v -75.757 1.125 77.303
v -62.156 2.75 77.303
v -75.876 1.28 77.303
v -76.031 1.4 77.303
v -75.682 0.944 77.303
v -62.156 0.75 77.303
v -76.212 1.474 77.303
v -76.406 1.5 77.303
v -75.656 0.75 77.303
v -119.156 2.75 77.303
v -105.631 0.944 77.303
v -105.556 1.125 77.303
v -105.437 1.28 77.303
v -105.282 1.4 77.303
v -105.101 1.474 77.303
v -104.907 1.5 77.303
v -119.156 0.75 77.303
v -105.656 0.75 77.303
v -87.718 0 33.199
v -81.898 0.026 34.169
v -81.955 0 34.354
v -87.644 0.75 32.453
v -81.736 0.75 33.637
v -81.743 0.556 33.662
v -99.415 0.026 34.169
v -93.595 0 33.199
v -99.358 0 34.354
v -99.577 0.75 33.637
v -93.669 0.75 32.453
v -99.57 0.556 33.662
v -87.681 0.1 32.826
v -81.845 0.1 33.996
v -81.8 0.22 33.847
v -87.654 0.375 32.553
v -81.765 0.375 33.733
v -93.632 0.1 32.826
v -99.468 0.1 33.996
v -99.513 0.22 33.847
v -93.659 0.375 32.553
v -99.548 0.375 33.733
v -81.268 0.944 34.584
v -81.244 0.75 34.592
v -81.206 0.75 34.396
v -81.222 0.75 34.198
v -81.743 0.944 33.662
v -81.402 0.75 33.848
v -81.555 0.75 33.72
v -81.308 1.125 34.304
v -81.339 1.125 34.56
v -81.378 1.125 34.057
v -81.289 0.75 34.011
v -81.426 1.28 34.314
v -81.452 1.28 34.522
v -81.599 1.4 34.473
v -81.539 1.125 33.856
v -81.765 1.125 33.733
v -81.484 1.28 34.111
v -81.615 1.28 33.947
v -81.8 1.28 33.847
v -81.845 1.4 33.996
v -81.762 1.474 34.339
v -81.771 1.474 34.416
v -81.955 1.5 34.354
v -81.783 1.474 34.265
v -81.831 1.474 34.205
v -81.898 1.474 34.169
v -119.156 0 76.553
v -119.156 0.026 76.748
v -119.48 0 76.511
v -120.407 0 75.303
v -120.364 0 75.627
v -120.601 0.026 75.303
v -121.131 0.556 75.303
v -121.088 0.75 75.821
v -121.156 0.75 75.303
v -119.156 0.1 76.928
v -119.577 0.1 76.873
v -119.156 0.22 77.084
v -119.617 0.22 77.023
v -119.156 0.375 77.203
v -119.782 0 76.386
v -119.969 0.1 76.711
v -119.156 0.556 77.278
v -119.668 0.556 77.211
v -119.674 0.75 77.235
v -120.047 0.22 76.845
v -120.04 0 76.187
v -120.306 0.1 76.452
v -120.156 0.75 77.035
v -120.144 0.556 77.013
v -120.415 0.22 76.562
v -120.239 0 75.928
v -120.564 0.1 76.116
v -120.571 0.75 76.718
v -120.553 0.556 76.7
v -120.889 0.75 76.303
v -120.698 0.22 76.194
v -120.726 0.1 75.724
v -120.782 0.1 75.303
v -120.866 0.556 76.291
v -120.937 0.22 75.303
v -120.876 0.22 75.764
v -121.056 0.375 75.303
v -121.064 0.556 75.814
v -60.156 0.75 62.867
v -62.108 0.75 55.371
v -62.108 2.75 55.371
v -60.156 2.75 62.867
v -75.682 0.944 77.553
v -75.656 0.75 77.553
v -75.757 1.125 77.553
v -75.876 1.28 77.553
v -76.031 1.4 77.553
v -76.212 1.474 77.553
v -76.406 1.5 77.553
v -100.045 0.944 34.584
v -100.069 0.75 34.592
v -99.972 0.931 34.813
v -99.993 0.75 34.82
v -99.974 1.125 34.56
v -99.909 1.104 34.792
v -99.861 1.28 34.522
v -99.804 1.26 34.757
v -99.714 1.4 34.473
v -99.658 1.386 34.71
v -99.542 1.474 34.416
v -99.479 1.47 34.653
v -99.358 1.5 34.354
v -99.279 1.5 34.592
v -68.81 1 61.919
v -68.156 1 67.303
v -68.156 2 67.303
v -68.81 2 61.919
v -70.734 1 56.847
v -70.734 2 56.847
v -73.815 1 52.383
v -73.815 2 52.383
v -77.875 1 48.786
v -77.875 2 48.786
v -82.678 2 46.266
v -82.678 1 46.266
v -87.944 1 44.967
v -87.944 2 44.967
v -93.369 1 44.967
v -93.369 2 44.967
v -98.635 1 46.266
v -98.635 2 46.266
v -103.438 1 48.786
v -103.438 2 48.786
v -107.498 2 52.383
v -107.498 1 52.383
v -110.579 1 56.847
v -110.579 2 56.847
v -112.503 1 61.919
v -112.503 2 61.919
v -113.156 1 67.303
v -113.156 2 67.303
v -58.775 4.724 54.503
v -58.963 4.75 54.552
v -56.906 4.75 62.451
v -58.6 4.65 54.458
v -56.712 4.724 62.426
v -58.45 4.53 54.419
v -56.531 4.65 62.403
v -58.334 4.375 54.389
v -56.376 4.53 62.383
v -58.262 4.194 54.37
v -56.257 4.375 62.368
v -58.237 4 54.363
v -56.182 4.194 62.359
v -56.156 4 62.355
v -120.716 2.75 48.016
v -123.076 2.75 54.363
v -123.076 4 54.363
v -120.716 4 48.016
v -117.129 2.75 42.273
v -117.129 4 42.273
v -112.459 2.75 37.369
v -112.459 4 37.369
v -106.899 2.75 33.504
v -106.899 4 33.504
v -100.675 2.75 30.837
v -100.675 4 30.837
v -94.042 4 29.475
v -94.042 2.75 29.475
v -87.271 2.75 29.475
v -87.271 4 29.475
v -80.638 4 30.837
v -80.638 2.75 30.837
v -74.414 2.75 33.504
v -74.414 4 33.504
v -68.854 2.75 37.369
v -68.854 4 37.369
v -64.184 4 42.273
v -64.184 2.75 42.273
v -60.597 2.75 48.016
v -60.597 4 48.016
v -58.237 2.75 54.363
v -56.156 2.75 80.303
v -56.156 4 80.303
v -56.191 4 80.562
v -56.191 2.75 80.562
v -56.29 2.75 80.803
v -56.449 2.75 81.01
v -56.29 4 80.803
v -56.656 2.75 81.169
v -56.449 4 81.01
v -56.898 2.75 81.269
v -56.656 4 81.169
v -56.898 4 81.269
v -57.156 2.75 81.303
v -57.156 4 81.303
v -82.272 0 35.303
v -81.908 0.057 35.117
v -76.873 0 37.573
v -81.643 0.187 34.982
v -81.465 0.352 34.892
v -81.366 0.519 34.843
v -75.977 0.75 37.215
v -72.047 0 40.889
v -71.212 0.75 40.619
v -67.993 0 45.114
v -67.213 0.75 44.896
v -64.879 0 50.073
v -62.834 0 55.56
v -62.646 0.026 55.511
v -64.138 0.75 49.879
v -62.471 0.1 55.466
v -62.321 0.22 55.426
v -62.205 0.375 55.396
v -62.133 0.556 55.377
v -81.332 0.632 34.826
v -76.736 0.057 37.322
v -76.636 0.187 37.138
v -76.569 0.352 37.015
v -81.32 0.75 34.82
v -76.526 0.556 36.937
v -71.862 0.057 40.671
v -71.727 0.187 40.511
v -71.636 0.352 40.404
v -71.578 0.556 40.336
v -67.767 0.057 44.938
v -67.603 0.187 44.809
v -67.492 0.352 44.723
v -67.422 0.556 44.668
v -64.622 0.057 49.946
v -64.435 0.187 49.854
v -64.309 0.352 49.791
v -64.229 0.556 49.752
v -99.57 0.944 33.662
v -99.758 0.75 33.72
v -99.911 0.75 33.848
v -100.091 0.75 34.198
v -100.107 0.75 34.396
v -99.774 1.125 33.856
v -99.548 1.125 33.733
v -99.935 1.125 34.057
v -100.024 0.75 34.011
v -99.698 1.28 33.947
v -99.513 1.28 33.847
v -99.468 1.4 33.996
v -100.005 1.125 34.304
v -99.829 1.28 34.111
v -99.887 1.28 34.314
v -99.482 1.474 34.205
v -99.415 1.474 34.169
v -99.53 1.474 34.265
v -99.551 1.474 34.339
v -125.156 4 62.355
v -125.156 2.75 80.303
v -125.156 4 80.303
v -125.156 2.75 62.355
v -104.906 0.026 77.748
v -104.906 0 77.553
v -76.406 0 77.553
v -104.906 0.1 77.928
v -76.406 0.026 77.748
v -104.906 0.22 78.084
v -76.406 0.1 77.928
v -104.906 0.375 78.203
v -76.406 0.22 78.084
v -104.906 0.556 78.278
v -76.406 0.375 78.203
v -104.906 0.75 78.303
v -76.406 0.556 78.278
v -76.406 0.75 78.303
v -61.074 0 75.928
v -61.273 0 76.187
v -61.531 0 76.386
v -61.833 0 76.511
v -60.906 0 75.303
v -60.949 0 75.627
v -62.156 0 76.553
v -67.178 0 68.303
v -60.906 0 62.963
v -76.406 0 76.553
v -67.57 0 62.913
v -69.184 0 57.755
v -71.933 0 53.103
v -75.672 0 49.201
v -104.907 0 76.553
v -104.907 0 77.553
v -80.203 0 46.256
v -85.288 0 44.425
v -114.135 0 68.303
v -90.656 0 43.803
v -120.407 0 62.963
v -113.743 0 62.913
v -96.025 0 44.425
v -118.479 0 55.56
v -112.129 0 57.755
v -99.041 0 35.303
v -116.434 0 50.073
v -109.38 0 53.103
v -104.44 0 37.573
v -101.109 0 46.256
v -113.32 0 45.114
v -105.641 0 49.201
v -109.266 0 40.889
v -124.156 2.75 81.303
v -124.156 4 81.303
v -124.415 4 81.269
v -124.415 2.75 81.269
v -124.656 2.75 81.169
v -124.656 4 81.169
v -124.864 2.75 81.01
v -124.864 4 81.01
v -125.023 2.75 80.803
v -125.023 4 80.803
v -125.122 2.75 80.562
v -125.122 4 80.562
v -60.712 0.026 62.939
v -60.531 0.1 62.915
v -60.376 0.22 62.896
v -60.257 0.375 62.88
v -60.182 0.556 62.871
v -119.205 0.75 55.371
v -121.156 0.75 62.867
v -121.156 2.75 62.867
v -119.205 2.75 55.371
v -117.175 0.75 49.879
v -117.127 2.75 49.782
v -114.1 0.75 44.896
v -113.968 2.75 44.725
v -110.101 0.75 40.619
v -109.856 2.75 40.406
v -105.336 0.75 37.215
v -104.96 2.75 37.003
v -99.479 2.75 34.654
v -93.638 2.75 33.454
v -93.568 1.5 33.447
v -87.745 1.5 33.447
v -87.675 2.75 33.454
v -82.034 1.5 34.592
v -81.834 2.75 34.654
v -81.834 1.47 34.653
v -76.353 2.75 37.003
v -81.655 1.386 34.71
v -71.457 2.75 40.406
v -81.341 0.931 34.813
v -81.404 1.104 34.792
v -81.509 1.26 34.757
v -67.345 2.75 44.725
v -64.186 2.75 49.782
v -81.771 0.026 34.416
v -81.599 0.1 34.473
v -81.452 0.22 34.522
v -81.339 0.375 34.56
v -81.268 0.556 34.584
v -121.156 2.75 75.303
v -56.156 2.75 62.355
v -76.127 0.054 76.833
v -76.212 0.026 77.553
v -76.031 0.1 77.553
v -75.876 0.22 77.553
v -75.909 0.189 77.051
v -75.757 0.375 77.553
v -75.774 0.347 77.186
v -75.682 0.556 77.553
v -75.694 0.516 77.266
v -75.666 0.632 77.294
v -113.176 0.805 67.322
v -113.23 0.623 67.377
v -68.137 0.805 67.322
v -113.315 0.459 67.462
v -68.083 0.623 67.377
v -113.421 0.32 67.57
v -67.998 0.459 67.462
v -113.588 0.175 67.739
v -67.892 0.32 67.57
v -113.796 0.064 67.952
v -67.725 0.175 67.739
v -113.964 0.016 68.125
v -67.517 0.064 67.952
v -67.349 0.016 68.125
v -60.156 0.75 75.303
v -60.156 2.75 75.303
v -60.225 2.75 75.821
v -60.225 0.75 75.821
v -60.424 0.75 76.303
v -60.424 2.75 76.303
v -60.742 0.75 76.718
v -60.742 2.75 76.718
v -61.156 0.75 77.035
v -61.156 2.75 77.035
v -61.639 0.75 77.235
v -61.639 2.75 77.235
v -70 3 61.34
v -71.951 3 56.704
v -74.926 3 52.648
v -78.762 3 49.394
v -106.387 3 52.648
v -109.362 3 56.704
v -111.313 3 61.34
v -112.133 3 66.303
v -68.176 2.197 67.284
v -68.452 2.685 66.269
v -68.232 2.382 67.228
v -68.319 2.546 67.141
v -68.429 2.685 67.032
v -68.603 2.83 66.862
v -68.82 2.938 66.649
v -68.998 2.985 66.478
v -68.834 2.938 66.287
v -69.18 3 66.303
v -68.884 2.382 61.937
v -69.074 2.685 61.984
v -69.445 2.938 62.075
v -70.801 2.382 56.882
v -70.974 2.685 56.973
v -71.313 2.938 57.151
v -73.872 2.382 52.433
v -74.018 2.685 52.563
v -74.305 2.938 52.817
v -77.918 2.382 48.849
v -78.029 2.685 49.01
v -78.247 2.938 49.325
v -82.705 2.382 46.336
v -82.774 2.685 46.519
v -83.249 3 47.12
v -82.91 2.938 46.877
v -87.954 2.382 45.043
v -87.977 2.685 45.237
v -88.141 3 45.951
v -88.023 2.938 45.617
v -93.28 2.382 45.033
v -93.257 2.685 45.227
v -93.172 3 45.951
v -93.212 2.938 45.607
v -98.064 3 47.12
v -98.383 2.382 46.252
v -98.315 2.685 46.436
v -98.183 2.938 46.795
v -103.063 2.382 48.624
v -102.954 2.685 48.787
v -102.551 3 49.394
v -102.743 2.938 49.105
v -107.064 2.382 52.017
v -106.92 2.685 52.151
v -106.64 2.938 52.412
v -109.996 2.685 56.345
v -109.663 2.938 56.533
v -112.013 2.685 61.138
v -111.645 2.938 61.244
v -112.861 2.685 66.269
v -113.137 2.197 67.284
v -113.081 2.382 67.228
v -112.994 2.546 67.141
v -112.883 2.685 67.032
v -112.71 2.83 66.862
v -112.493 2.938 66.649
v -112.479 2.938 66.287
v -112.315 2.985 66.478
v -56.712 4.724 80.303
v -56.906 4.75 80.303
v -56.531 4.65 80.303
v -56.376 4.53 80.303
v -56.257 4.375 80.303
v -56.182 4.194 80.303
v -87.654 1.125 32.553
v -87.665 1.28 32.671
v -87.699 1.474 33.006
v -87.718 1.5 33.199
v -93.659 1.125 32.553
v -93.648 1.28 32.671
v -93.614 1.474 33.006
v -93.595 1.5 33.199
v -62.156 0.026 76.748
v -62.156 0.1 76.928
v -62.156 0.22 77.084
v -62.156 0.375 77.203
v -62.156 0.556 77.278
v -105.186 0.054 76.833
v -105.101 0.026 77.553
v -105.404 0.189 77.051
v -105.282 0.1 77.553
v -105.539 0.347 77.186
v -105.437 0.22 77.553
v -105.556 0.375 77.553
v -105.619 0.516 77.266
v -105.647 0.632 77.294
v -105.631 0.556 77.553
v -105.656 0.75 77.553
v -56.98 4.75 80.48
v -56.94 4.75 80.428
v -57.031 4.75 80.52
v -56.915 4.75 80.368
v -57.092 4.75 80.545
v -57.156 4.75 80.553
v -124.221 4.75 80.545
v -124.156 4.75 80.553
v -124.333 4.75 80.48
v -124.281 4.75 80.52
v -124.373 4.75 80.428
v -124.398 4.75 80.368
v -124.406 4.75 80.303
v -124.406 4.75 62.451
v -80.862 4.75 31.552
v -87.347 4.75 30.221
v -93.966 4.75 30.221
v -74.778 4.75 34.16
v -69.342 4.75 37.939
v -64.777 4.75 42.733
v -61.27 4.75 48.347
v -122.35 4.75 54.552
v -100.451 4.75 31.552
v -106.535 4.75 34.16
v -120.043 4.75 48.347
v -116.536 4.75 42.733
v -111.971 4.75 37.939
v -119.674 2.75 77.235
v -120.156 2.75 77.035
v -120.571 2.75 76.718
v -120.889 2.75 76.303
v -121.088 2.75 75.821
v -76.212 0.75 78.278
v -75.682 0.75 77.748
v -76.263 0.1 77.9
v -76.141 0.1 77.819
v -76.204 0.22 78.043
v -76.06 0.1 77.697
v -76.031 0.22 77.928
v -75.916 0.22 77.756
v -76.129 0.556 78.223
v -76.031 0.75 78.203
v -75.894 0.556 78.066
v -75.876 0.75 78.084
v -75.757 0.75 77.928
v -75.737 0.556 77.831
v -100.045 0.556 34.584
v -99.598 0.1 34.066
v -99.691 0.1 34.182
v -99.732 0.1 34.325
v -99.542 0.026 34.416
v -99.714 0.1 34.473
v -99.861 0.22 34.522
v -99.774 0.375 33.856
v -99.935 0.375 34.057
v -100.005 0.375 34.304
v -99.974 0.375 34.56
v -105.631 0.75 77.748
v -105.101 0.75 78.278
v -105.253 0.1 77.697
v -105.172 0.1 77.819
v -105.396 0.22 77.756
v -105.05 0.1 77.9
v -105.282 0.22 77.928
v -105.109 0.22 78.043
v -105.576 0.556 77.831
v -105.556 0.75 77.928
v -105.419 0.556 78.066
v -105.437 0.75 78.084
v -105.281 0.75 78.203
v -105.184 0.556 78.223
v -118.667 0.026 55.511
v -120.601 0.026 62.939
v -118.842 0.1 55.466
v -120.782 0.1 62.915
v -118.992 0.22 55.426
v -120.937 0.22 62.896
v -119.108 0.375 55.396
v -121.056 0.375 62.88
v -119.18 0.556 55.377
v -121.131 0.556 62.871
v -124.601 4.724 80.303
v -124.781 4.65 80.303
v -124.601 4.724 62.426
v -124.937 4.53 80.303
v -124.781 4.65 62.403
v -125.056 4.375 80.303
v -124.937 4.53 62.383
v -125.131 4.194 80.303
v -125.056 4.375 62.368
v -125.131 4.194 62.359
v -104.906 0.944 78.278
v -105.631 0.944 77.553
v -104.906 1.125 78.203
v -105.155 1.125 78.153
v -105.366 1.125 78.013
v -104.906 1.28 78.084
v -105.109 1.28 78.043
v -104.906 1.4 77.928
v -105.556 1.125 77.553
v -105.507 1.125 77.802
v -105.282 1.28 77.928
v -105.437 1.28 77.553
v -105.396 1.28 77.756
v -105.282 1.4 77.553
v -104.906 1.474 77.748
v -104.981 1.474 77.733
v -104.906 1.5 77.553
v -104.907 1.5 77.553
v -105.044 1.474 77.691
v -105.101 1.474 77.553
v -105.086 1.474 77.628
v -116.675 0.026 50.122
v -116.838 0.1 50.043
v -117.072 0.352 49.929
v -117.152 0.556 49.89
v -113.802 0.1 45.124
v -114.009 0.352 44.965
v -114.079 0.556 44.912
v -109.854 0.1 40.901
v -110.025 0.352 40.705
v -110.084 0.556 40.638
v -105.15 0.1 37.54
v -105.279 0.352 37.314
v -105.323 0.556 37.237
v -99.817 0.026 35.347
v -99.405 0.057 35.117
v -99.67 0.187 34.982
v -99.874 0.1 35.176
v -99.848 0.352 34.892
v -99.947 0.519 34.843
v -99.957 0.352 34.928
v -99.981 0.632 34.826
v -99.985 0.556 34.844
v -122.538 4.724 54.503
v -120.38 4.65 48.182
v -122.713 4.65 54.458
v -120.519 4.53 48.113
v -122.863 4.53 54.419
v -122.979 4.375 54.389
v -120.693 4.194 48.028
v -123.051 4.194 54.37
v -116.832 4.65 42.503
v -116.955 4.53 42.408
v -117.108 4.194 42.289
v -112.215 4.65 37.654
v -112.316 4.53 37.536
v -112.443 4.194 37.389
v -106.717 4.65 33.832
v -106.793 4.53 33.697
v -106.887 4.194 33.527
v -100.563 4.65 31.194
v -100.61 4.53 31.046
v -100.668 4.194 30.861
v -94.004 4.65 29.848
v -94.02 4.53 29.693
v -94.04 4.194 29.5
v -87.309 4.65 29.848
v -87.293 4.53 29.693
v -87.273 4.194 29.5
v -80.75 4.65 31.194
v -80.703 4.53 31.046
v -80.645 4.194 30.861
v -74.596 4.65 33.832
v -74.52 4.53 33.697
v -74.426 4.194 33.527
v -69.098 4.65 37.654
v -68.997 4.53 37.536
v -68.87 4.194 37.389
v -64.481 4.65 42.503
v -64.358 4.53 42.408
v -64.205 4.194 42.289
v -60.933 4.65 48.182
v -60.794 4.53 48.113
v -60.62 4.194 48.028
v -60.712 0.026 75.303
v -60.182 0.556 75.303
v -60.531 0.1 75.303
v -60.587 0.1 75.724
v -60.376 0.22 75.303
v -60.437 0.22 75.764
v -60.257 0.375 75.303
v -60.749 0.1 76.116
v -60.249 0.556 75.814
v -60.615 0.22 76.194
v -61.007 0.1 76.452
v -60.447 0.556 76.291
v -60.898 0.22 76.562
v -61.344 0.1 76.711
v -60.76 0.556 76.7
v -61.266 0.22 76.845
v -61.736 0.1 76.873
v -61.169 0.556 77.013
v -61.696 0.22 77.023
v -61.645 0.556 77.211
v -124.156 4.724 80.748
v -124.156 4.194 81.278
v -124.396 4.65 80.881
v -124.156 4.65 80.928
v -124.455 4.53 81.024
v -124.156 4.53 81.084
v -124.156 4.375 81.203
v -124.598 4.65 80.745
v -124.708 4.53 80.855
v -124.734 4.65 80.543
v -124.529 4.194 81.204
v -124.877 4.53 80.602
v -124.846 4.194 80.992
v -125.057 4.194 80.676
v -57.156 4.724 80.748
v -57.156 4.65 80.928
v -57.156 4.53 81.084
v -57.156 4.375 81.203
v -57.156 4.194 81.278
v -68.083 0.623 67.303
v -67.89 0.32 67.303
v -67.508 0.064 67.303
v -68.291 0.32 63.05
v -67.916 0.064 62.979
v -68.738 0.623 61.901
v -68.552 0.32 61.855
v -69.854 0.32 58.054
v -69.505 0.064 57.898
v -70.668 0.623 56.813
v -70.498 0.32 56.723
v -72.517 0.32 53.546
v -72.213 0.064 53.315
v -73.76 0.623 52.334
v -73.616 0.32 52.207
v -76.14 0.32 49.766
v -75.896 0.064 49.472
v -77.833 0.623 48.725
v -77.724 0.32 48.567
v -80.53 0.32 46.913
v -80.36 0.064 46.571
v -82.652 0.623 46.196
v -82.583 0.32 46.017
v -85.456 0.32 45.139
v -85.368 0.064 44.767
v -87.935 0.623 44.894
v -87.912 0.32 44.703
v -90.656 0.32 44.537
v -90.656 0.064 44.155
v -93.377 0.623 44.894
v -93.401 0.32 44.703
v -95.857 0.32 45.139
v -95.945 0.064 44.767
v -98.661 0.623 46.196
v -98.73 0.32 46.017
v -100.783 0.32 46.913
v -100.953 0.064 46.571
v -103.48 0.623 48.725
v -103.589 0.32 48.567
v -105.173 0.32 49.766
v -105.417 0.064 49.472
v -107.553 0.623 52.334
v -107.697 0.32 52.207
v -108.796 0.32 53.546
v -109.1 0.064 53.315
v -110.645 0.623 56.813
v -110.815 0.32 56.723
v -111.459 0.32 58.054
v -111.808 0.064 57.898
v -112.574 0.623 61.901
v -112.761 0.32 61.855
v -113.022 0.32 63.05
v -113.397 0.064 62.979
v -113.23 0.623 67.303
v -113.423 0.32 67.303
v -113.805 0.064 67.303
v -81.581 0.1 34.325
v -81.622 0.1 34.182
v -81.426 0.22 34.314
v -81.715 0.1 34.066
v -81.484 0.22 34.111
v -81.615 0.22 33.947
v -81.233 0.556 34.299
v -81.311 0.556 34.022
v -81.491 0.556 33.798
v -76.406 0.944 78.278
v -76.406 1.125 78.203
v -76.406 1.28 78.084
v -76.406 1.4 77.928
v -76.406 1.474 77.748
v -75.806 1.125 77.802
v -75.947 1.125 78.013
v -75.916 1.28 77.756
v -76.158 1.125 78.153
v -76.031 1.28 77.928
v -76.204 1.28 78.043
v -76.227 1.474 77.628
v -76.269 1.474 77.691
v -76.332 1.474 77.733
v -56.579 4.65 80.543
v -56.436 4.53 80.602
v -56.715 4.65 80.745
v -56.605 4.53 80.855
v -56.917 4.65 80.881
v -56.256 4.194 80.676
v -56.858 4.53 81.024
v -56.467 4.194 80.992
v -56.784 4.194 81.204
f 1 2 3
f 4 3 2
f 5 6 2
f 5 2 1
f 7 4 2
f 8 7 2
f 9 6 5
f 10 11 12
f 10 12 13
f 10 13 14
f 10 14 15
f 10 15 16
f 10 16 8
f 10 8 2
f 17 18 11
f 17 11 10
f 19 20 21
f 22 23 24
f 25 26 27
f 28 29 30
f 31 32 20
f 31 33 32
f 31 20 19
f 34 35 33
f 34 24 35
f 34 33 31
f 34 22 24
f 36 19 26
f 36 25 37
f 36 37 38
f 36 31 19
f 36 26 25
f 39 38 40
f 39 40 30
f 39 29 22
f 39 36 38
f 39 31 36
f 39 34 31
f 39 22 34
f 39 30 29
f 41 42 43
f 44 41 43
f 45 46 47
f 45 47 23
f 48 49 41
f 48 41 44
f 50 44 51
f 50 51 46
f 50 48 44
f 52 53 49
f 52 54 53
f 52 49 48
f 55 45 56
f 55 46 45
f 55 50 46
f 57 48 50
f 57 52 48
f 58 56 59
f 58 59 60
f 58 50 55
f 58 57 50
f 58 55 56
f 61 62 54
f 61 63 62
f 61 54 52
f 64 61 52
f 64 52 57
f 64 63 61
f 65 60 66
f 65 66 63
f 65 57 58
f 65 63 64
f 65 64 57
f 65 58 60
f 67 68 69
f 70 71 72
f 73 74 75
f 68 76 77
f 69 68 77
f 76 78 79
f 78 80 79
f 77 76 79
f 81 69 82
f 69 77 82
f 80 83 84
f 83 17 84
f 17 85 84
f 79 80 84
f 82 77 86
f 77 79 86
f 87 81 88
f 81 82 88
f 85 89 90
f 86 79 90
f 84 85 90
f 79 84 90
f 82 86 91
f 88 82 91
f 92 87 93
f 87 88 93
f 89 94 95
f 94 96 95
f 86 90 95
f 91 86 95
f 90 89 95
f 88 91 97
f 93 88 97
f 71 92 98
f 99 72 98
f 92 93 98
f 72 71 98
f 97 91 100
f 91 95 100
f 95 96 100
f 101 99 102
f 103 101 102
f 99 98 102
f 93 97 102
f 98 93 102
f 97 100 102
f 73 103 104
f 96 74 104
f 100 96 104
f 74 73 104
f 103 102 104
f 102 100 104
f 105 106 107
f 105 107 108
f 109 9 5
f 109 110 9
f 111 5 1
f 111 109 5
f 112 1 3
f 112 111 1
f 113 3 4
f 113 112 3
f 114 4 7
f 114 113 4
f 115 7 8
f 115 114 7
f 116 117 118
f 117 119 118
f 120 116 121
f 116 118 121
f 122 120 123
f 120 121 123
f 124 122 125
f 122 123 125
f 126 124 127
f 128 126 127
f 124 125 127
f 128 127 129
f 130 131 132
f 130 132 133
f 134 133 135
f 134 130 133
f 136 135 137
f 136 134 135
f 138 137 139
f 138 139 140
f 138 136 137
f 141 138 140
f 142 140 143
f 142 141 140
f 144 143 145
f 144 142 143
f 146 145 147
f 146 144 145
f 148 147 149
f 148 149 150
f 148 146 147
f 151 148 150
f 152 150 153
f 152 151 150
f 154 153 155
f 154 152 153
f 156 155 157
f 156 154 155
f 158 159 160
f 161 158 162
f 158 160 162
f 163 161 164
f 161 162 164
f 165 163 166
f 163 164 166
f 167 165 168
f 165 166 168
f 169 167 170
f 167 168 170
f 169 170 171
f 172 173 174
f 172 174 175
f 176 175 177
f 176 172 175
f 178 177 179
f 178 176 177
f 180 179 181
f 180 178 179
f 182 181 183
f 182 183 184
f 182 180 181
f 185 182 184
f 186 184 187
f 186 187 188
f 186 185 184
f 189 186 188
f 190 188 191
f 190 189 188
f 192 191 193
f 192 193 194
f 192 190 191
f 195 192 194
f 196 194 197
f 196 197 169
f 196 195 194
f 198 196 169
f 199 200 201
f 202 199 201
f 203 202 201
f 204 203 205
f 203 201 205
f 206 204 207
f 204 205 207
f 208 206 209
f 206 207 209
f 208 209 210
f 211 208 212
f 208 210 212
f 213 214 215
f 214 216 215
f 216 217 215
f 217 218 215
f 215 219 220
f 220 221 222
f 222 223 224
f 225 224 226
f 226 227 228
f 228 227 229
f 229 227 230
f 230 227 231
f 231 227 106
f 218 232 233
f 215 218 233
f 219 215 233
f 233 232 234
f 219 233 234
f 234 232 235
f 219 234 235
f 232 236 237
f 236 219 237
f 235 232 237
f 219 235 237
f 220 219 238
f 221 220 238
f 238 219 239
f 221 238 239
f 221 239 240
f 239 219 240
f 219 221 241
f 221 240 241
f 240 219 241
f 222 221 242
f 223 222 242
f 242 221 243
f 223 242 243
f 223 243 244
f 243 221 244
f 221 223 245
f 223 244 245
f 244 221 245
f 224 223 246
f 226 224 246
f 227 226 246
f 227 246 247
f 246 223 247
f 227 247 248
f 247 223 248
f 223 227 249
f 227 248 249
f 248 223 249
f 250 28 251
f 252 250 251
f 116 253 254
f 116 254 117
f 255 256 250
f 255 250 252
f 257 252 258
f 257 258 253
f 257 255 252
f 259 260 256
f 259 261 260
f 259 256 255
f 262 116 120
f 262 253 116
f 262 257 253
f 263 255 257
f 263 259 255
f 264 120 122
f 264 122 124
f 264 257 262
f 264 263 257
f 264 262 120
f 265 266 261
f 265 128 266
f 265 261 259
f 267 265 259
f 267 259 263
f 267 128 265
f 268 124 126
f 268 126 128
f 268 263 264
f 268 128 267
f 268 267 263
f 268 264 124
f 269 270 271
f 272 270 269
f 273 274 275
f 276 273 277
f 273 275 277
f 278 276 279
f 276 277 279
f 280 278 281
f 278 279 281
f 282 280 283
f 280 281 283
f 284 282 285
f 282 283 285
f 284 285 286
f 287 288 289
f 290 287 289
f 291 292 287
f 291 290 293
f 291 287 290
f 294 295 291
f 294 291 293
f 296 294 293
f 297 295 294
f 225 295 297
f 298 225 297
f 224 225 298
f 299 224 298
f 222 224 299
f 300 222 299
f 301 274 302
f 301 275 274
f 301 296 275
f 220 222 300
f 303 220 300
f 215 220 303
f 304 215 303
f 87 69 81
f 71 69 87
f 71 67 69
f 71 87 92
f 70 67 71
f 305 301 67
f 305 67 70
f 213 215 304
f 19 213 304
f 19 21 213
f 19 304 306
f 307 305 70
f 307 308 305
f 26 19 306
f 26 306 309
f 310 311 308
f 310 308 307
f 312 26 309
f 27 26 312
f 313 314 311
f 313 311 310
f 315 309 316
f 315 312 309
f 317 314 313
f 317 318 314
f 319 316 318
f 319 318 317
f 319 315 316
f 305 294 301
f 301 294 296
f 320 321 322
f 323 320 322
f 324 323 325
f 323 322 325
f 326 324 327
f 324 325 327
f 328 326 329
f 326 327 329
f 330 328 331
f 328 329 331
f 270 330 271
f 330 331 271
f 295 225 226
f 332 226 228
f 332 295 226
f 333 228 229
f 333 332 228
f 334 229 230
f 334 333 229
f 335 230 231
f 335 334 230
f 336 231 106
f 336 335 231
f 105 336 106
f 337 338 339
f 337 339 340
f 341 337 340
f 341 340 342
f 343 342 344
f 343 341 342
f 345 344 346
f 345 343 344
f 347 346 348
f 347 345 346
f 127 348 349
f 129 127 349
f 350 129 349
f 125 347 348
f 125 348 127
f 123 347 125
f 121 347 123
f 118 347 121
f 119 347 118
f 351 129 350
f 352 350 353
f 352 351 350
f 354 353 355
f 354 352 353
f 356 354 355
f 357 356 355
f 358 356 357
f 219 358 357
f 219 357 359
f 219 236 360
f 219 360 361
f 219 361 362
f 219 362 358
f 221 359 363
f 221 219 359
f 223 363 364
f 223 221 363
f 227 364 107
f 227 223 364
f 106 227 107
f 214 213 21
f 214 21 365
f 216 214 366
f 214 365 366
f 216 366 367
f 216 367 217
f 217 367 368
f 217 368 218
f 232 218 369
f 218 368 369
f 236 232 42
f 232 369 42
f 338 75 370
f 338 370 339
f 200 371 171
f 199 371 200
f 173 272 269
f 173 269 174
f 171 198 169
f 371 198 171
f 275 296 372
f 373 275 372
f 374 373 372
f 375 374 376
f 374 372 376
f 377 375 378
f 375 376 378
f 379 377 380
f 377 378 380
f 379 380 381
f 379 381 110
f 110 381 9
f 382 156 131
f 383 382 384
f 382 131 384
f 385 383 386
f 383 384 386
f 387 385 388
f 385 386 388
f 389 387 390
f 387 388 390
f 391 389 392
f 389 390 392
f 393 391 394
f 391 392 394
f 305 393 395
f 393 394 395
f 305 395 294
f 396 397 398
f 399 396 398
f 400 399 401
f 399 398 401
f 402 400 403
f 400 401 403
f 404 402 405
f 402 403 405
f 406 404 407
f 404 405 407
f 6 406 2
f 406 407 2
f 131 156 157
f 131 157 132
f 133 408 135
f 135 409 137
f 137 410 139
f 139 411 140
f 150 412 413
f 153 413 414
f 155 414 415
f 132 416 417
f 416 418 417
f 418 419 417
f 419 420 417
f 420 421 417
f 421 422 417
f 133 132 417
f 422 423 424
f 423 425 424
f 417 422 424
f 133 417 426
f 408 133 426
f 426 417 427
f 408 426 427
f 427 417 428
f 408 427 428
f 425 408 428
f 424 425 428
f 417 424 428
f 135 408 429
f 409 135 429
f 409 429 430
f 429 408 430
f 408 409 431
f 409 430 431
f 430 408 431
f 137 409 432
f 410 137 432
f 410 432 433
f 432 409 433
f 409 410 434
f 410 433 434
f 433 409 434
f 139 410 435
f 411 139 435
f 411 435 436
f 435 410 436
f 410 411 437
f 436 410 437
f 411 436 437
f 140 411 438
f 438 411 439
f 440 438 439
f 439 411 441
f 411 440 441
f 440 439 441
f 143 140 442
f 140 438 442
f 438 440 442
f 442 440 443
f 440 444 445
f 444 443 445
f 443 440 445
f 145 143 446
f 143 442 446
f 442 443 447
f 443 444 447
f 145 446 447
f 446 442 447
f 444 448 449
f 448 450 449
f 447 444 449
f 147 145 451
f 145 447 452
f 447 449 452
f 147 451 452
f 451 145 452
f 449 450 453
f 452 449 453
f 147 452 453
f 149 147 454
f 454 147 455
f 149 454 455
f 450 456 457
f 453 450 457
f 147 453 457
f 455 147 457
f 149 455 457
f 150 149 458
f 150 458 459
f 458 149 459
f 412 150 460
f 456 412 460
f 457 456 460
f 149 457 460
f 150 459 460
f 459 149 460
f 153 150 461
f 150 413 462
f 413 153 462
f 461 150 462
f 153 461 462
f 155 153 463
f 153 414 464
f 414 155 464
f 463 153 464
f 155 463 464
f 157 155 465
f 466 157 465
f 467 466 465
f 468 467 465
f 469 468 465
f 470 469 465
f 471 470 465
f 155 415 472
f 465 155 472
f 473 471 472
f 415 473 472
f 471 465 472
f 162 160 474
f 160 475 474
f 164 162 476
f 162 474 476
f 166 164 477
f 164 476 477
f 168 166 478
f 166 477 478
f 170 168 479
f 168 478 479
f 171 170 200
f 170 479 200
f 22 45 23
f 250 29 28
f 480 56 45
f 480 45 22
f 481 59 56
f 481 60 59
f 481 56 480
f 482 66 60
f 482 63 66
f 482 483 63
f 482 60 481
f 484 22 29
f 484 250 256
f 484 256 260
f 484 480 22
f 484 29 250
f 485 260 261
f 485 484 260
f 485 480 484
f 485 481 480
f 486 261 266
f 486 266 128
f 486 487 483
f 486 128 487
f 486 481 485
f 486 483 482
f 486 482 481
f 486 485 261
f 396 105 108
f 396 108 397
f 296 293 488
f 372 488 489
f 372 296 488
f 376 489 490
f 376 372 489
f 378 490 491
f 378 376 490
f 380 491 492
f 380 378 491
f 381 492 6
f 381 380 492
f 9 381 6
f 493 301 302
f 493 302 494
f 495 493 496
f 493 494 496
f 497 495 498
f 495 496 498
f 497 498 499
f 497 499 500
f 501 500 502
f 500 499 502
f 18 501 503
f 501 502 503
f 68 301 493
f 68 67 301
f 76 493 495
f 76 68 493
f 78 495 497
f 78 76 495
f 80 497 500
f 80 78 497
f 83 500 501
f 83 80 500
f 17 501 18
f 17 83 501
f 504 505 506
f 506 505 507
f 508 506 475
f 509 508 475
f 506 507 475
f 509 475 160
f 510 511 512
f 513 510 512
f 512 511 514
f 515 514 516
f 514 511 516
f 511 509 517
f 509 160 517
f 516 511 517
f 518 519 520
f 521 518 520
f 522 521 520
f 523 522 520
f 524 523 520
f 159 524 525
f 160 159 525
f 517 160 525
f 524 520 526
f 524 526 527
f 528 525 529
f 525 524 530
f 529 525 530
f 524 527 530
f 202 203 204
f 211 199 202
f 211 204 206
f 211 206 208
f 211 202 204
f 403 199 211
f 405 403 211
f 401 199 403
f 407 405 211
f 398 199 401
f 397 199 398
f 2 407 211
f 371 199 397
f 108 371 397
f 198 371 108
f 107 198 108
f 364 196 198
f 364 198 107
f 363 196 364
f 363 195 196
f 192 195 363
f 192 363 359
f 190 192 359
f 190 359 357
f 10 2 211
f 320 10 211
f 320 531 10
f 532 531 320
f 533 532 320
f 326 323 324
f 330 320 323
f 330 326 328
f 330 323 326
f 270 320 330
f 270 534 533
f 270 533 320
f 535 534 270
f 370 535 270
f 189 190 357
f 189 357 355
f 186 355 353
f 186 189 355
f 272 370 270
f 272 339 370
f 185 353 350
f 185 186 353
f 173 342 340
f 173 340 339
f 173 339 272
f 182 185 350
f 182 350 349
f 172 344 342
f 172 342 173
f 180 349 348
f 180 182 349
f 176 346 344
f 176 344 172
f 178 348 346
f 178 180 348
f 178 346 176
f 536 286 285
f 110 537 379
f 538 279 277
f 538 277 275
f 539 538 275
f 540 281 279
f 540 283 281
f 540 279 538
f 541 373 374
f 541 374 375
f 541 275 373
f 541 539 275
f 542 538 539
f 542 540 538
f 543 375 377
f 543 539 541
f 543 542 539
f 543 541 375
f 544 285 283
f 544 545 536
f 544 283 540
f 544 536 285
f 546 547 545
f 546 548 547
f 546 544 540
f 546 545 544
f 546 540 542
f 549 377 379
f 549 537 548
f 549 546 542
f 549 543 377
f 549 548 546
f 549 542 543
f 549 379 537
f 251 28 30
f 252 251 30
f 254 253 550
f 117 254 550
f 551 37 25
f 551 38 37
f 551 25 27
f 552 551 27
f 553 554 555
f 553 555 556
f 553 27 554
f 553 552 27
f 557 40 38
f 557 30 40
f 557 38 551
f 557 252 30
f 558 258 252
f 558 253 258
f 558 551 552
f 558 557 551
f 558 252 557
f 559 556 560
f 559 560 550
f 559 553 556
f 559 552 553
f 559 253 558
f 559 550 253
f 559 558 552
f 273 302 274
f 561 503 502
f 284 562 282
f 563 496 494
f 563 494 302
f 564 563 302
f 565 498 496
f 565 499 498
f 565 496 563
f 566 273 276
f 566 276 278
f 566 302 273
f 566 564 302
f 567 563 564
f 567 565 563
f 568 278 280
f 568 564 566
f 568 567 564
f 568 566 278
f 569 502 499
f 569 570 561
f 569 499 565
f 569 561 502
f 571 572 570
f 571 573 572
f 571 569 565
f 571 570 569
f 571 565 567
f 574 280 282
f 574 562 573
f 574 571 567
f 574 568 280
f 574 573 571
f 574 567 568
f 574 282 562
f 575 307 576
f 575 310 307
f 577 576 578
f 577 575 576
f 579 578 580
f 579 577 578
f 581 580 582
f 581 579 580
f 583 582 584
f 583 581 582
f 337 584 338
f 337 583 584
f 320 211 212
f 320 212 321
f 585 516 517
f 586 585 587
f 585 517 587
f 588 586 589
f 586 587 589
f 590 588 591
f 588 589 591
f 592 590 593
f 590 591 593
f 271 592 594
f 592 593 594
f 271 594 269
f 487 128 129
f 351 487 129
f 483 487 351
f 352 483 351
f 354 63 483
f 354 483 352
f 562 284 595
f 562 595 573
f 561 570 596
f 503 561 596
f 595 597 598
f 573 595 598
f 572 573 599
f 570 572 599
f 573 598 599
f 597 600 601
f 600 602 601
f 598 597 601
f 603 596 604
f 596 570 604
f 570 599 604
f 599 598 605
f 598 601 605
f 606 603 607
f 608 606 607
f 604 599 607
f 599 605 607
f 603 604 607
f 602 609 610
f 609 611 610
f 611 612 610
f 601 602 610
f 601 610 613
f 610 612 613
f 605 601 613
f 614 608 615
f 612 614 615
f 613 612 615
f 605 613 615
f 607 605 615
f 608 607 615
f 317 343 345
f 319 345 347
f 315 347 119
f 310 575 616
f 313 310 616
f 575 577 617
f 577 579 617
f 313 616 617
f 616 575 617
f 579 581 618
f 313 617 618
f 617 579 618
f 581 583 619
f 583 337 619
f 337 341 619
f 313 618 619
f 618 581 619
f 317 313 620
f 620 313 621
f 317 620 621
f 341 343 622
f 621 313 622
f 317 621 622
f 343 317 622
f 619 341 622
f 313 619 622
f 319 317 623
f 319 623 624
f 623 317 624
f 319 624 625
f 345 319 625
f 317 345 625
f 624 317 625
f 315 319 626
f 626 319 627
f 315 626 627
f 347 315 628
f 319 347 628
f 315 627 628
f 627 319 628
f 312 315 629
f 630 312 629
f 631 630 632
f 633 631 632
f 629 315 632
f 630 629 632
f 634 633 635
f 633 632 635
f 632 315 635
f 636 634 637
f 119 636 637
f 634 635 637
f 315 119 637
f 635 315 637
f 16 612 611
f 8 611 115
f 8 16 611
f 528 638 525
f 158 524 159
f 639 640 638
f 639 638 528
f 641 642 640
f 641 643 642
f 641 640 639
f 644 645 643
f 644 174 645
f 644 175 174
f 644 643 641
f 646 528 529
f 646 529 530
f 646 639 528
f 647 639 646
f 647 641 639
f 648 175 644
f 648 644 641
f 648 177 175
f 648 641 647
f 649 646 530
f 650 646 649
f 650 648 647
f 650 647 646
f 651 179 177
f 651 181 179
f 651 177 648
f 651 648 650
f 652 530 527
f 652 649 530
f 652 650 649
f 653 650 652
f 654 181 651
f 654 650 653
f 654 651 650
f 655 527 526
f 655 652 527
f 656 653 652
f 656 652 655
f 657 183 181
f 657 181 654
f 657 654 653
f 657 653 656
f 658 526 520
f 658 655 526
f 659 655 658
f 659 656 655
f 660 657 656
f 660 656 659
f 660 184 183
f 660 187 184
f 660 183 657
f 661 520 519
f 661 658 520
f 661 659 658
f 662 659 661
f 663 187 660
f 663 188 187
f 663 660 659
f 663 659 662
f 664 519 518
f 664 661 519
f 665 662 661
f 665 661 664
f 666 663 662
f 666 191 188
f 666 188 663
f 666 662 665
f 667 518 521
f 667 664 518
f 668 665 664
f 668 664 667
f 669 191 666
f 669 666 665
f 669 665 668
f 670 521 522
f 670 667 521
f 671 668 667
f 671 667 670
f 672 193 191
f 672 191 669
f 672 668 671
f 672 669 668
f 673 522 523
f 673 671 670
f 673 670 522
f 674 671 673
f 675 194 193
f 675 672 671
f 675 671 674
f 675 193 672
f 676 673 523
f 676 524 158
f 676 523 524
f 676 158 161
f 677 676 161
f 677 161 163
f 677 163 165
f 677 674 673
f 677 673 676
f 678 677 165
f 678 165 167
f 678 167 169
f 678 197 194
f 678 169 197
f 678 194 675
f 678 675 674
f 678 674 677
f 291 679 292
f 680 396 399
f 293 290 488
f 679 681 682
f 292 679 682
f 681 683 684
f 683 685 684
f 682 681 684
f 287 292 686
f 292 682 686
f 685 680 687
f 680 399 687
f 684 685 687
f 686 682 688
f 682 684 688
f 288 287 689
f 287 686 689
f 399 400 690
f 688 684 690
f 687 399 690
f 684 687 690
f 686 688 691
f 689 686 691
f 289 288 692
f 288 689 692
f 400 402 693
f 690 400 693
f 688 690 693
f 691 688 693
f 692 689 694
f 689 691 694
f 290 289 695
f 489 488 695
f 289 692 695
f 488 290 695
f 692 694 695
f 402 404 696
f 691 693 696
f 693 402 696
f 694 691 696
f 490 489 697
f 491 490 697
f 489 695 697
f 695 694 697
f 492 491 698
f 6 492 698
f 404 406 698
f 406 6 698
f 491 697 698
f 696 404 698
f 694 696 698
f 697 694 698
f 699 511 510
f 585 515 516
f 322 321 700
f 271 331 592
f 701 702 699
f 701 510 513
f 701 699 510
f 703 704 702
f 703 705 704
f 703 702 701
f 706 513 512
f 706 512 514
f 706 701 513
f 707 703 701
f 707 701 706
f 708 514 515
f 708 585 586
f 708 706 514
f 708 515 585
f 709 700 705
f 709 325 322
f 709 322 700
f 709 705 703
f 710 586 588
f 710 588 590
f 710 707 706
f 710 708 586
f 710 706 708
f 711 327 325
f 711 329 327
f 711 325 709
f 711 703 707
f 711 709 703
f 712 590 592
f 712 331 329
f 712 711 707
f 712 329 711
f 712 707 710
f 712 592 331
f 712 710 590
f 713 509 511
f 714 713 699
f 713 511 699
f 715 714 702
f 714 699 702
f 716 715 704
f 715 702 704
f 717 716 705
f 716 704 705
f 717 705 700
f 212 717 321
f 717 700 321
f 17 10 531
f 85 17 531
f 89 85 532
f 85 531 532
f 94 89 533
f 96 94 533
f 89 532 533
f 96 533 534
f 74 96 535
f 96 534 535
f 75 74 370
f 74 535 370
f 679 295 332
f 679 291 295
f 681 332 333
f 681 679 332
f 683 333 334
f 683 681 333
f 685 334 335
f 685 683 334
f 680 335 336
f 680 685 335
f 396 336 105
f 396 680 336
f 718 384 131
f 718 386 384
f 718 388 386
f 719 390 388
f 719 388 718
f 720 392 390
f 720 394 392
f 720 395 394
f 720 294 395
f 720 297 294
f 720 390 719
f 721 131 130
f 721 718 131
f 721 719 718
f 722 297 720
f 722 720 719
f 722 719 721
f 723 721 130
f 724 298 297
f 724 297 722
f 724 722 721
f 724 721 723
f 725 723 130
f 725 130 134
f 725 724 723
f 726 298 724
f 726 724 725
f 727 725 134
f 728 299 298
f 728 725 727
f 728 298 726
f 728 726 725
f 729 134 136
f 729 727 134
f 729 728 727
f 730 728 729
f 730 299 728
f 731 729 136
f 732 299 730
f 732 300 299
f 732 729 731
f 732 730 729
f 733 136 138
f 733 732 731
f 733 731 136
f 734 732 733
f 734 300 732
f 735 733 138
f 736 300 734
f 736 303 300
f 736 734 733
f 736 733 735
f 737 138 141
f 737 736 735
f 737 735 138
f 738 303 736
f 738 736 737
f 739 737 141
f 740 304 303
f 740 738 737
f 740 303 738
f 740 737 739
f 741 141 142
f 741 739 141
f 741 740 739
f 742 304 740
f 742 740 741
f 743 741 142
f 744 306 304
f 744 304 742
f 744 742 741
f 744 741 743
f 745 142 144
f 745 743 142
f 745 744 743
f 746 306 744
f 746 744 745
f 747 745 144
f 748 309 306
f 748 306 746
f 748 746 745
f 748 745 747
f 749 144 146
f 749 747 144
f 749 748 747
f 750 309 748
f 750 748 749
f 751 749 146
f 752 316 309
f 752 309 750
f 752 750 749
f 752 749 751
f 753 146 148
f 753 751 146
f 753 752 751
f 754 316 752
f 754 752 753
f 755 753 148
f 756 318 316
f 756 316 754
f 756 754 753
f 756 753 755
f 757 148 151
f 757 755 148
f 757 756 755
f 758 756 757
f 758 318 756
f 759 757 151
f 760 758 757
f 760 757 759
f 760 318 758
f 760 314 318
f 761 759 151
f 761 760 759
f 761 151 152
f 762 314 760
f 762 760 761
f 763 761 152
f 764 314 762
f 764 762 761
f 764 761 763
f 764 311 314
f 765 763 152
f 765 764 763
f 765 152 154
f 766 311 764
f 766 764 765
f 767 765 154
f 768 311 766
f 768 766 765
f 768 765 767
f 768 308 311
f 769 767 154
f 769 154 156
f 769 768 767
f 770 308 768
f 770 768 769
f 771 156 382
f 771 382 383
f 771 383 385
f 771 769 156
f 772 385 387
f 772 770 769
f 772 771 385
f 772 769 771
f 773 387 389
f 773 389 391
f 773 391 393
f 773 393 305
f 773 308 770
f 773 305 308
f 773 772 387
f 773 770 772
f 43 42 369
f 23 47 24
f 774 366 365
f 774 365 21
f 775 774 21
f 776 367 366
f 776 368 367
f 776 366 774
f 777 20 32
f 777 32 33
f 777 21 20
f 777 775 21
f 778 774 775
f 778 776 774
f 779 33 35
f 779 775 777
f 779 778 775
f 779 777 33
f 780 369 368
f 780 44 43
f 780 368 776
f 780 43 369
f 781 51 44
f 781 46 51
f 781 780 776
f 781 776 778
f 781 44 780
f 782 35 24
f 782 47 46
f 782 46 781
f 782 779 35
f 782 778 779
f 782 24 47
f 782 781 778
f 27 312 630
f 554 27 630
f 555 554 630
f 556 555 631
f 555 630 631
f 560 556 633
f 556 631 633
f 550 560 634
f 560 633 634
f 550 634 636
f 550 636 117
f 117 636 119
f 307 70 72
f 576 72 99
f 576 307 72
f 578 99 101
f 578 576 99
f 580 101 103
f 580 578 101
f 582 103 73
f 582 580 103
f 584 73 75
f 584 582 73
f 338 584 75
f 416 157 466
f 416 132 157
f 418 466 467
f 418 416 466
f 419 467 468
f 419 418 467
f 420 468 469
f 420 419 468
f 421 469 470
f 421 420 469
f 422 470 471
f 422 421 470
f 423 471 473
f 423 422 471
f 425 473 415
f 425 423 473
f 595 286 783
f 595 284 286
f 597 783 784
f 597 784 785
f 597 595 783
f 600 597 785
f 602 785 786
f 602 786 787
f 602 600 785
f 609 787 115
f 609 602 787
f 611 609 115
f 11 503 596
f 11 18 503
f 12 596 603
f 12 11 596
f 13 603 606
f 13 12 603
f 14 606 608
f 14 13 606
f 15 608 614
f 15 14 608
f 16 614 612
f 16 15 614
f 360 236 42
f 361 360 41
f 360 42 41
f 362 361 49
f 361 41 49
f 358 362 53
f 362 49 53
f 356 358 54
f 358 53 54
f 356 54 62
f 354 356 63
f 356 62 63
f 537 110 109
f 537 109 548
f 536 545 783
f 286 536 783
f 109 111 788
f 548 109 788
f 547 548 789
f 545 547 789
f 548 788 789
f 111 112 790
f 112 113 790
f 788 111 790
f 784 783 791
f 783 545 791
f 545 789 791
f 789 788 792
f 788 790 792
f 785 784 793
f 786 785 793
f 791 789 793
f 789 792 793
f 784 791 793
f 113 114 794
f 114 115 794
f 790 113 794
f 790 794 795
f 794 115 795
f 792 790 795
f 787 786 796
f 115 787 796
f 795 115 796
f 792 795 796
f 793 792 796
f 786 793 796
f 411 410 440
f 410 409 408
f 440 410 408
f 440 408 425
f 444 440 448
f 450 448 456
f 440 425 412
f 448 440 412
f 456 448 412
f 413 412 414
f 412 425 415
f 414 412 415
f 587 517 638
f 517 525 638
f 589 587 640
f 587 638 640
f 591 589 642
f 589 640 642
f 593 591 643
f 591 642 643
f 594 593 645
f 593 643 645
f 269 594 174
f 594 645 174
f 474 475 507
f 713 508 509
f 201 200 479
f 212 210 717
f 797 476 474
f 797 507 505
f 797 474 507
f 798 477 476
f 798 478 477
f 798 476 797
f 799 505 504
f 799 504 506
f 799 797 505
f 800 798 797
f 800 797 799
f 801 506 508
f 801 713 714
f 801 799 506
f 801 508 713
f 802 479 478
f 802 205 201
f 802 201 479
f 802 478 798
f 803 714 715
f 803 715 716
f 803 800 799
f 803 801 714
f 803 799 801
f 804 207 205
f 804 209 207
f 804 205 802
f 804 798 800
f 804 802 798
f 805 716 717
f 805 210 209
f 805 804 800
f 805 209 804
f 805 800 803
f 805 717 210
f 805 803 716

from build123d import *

# Parameters (mm, degrees)
BOSS_EXTRUDE1_DEPTH = 2.75
SKETCH12_W          = 30
SKETCH12_H          = 1.5
BOSS_EXTRUDE4_DEPTH = 1
FILLET7_R           = 0.75
FILLET8_R           = 0.75
BOSS_EXTRUDE5_DEPTH = 2
WRAP4_SECTION_W     = 1
WRAP4_SECTION_H     = 1.5
WRAP4_ANGLE         = 36.902366466
FILLET12_R          = 1
FILLET14_R          = 2
FILLET19_R          = 0.75
FILLET20_R          = 0.75
FILLET21_R          = 0.75
CUT_EXTRUDE1_DEPTH  = 3
FILLET22_R          = 1
FILLET23_R          = 1
FILLET24_R          = 0.75


with BuildPart() as part:
    # Sketch2 → Boss-Extrude1 (new body)
    with BuildSketch(Plane(origin=(0, 0, 0), x_dir=(1, 0, 0), z_dir=(0, 1, 0))):
        with BuildLine():
            Line((-62.108092304, -55.371051932), (-60.156479401, -62.867404741))
            Line((-60.156479401, -62.867404741), (-60.156479401, -77.303386301))
            Line((-60.156479401, -77.303386301), (-121.156479401, -77.303386301))
            Line((-121.156479401, -77.303386301), (-121.156479401, -62.867404741))
            Line((-121.156479401, -62.867404741), (-119.204866498, -55.371051932))
            ThreePointArc((-119.204866498, -55.371051932), (-90.656479401, -33.303386301), (-62.108092304, -55.371051932))
        make_face()
    extrude(amount=BOSS_EXTRUDE1_DEPTH)

    # Sketch12 → Boss-Extrude4 (add)
    with BuildSketch(Plane.XY.offset(77.303386301)):
        with Locations((-90.656479401, 0.75)):
            Rectangle(SKETCH12_W, SKETCH12_H)
    extrude(amount=BOSS_EXTRUDE4_DEPTH)

    # Fillet7
    fillet7_edges = [part.edges().sort_by_distance(p)[0] for p in [
        (-75.656479401, 0.75, 78.303386301),
        (-105.656479401, 0.75, 78.303386301),
    ]]
    fillet(fillet7_edges, radius=FILLET7_R)

    # Fillet8
    fillet8_edges = [part.edges().sort_by_distance(p)[0] for p in [
        (-105.656479401, 0, 77.428386301),
        (-105.436809487, 0, 78.083716387),
        (-75.656479401, 0, 77.428386301),
        (-75.876149315, 0, 78.083716387),
        (-75.656479401, 1.5, 77.428386301),
        (-75.876149315, 1.5, 78.083716387),
        (-105.656479401, 1.5, 77.428386301),
        (-105.436809487, 1.5, 78.083716387),
        (-90.656479401, 0, 78.303386301),
        (-90.656479401, 1.5, 78.303386301),
    ]]
    fillet(fillet8_edges, radius=FILLET8_R - 0.0001)  # a hair under: the kernel refuses the full size

    # Sketch13 → Boss-Extrude5 (add)
    with BuildSketch(Plane(origin=(0, 2.75, 0), x_dir=(1, 0, 0), z_dir=(0, 1, 0))):
        with BuildLine():
            Line((-58.237124562, -54.36327778), (-56.156479401, -62.355257221))
            Line((-56.156479401, -62.355257221), (-56.156479401, -81.303386301))
            Line((-56.156479401, -81.303386301), (-125.156479401, -81.303386301))
            Line((-125.156479401, -81.303386301), (-125.156479401, -62.355257221))
            Line((-125.156479401, -62.355257221), (-123.075834239, -54.36327778))
            ThreePointArc((-123.075834239, -54.36327778), (-90.656479401, -29.303386301), (-58.237124562, -54.36327778))
        make_face()
    extrude(amount=BOSS_EXTRUDE5_DEPTH)

    # Wrap4 section (on wrap section) → Wrap4 (revolve)
    with BuildSketch(Plane(origin=(-90.656479401, 0, 62.803386301), x_dir=(-0.3164965569528064, 0, -0.9485936587585957), z_dir=(-0.9485936587585957, 0, 0.3164965569528064))):
        with Locations((30, -0.75)):
            Rectangle(WRAP4_SECTION_W, WRAP4_SECTION_H)
    revolve(axis=Axis((-90.656479401, 0, 62.803386301), (0, -1, 0)), revolution_arc=WRAP4_ANGLE)

    # Fillet12
    fillet12_edges = [part.edges().sort_by_distance(p)[0] for p in [
        (-125.156479401, 3.75, 81.303386301),
        (-56.156479401, 3.75, 81.303386301),
    ]]
    fillet(fillet12_edges, radius=FILLET12_R)

    # Fillet14
    fillet14_edges = [part.edges().sort_by_distance(p)[0] for p in [
        (-121.156479401, 1.375, 77.303386301),
        (-60.156479401, 1.375, 77.303386301),
    ]]
    fillet(fillet14_edges, radius=FILLET14_R)

    # Fillet19
    fillet19_edges = [part.edges().sort_by_distance(p)[0] for p in [
        (-100.309624388, 0.75, 33.871279709),
        (-81.003334414, 0.75, 33.871279709),
    ]]
    fillet(fillet19_edges, radius=FILLET19_R)

    # Fillet20
    fillet20_edges = [part.edges().sort_by_distance(p)[0] for p in [
        (-81.281765183, 0, 34.705783772),
        (-81.281765183, 1.5, 34.705783772),
        (-90.656479401, 1.5, 32.303386301),
        (-100.031193618, 1.5, 34.705783772),
        (-90.656479401, 0, 32.303386301),
        (-100.031193618, 0, 34.705783772),
        (-100.024450454, 1.5, 34.010670695),
        (-81.288508347, 1.5, 34.010670695),
        (-100.024450454, 0, 34.010670695),
        (-81.288508347, 0, 34.010670695),
    ]]
    fillet(fillet20_edges, radius=FILLET20_R - 0.0001)  # a hair under: the kernel refuses the full size

    # Fillet21
    fillet21_edges = [part.edges().sort_by_distance(p)[0] for p in [
        (-90.656479401, 4.75, 81.303386301),
        (-56.156479401, 4.75, 71.329321761),
        (-56.44937262, 4.75, 81.010493082),
        (-124.863586182, 4.75, 81.010493082),
        (-90.656479401, 4.75, 29.303386301),
        (-124.11615682, 4.75, 58.359267501),
        (-125.156479401, 4.75, 71.329321761),
        (-57.196801981, 4.75, 58.359267501),
    ]]
    fillet(fillet21_edges, radius=FILLET21_R)

    # Sketch16 → Cut-Extrude1 (cut)
    with BuildSketch(Plane.XZ):
        with BuildLine():
            Line((-113.156479401, 67.303386301), (-68.156479401, 67.303386301))
            ThreePointArc((-68.156479401, 67.303386301), (-90.656479401, 44.803386301), (-113.156479401, 67.303386301))
        make_face()
    extrude(amount=-CUT_EXTRUDE1_DEPTH, mode=Mode.SUBTRACT)

    # Fillet22
    fillet22_edges = [part.edges().sort_by_distance(p)[0] for p in [
        (-90.656479401, 3, 44.803386301),
        (-90.656479401, 3, 67.303386301),
    ]]
    fillet(fillet22_edges, radius=FILLET22_R)

    # Fillet23
    fillet23_edges = [part.edges().sort_by_distance(p)[0] for p in [
        (-90.656479401, 0, 44.803386301),
        (-90.656479401, 0, 67.303386301),
    ]]
    fillet(fillet23_edges, radius=FILLET23_R)

    # Fillet24
    fillet24_edges = [part.edges().sort_by_distance(p)[0] for p in [
        (-111.948762062, 0, 42.385533841),
        (-120.180672949, 0, 59.119228337),
        (-121.156479401, 0, 69.085395521),
        (-120.570692963, 0, 76.717599863),
        (-112.031529401, 0, 77.303386301),
        (-69.281429401, 0, 77.303386301),
        (-60.742265838, 0, 76.717599863),
        (-60.156479401, 0, 69.085395521),
        (-61.132285852, 0, 59.119228337),
        (-69.36419674, 0, 42.385533841),
    ]]
    fillet(fillet24_edges, radius=FILLET24_R - 0.0001)  # a hair under: the kernel refuses the full size


solid = part.part
